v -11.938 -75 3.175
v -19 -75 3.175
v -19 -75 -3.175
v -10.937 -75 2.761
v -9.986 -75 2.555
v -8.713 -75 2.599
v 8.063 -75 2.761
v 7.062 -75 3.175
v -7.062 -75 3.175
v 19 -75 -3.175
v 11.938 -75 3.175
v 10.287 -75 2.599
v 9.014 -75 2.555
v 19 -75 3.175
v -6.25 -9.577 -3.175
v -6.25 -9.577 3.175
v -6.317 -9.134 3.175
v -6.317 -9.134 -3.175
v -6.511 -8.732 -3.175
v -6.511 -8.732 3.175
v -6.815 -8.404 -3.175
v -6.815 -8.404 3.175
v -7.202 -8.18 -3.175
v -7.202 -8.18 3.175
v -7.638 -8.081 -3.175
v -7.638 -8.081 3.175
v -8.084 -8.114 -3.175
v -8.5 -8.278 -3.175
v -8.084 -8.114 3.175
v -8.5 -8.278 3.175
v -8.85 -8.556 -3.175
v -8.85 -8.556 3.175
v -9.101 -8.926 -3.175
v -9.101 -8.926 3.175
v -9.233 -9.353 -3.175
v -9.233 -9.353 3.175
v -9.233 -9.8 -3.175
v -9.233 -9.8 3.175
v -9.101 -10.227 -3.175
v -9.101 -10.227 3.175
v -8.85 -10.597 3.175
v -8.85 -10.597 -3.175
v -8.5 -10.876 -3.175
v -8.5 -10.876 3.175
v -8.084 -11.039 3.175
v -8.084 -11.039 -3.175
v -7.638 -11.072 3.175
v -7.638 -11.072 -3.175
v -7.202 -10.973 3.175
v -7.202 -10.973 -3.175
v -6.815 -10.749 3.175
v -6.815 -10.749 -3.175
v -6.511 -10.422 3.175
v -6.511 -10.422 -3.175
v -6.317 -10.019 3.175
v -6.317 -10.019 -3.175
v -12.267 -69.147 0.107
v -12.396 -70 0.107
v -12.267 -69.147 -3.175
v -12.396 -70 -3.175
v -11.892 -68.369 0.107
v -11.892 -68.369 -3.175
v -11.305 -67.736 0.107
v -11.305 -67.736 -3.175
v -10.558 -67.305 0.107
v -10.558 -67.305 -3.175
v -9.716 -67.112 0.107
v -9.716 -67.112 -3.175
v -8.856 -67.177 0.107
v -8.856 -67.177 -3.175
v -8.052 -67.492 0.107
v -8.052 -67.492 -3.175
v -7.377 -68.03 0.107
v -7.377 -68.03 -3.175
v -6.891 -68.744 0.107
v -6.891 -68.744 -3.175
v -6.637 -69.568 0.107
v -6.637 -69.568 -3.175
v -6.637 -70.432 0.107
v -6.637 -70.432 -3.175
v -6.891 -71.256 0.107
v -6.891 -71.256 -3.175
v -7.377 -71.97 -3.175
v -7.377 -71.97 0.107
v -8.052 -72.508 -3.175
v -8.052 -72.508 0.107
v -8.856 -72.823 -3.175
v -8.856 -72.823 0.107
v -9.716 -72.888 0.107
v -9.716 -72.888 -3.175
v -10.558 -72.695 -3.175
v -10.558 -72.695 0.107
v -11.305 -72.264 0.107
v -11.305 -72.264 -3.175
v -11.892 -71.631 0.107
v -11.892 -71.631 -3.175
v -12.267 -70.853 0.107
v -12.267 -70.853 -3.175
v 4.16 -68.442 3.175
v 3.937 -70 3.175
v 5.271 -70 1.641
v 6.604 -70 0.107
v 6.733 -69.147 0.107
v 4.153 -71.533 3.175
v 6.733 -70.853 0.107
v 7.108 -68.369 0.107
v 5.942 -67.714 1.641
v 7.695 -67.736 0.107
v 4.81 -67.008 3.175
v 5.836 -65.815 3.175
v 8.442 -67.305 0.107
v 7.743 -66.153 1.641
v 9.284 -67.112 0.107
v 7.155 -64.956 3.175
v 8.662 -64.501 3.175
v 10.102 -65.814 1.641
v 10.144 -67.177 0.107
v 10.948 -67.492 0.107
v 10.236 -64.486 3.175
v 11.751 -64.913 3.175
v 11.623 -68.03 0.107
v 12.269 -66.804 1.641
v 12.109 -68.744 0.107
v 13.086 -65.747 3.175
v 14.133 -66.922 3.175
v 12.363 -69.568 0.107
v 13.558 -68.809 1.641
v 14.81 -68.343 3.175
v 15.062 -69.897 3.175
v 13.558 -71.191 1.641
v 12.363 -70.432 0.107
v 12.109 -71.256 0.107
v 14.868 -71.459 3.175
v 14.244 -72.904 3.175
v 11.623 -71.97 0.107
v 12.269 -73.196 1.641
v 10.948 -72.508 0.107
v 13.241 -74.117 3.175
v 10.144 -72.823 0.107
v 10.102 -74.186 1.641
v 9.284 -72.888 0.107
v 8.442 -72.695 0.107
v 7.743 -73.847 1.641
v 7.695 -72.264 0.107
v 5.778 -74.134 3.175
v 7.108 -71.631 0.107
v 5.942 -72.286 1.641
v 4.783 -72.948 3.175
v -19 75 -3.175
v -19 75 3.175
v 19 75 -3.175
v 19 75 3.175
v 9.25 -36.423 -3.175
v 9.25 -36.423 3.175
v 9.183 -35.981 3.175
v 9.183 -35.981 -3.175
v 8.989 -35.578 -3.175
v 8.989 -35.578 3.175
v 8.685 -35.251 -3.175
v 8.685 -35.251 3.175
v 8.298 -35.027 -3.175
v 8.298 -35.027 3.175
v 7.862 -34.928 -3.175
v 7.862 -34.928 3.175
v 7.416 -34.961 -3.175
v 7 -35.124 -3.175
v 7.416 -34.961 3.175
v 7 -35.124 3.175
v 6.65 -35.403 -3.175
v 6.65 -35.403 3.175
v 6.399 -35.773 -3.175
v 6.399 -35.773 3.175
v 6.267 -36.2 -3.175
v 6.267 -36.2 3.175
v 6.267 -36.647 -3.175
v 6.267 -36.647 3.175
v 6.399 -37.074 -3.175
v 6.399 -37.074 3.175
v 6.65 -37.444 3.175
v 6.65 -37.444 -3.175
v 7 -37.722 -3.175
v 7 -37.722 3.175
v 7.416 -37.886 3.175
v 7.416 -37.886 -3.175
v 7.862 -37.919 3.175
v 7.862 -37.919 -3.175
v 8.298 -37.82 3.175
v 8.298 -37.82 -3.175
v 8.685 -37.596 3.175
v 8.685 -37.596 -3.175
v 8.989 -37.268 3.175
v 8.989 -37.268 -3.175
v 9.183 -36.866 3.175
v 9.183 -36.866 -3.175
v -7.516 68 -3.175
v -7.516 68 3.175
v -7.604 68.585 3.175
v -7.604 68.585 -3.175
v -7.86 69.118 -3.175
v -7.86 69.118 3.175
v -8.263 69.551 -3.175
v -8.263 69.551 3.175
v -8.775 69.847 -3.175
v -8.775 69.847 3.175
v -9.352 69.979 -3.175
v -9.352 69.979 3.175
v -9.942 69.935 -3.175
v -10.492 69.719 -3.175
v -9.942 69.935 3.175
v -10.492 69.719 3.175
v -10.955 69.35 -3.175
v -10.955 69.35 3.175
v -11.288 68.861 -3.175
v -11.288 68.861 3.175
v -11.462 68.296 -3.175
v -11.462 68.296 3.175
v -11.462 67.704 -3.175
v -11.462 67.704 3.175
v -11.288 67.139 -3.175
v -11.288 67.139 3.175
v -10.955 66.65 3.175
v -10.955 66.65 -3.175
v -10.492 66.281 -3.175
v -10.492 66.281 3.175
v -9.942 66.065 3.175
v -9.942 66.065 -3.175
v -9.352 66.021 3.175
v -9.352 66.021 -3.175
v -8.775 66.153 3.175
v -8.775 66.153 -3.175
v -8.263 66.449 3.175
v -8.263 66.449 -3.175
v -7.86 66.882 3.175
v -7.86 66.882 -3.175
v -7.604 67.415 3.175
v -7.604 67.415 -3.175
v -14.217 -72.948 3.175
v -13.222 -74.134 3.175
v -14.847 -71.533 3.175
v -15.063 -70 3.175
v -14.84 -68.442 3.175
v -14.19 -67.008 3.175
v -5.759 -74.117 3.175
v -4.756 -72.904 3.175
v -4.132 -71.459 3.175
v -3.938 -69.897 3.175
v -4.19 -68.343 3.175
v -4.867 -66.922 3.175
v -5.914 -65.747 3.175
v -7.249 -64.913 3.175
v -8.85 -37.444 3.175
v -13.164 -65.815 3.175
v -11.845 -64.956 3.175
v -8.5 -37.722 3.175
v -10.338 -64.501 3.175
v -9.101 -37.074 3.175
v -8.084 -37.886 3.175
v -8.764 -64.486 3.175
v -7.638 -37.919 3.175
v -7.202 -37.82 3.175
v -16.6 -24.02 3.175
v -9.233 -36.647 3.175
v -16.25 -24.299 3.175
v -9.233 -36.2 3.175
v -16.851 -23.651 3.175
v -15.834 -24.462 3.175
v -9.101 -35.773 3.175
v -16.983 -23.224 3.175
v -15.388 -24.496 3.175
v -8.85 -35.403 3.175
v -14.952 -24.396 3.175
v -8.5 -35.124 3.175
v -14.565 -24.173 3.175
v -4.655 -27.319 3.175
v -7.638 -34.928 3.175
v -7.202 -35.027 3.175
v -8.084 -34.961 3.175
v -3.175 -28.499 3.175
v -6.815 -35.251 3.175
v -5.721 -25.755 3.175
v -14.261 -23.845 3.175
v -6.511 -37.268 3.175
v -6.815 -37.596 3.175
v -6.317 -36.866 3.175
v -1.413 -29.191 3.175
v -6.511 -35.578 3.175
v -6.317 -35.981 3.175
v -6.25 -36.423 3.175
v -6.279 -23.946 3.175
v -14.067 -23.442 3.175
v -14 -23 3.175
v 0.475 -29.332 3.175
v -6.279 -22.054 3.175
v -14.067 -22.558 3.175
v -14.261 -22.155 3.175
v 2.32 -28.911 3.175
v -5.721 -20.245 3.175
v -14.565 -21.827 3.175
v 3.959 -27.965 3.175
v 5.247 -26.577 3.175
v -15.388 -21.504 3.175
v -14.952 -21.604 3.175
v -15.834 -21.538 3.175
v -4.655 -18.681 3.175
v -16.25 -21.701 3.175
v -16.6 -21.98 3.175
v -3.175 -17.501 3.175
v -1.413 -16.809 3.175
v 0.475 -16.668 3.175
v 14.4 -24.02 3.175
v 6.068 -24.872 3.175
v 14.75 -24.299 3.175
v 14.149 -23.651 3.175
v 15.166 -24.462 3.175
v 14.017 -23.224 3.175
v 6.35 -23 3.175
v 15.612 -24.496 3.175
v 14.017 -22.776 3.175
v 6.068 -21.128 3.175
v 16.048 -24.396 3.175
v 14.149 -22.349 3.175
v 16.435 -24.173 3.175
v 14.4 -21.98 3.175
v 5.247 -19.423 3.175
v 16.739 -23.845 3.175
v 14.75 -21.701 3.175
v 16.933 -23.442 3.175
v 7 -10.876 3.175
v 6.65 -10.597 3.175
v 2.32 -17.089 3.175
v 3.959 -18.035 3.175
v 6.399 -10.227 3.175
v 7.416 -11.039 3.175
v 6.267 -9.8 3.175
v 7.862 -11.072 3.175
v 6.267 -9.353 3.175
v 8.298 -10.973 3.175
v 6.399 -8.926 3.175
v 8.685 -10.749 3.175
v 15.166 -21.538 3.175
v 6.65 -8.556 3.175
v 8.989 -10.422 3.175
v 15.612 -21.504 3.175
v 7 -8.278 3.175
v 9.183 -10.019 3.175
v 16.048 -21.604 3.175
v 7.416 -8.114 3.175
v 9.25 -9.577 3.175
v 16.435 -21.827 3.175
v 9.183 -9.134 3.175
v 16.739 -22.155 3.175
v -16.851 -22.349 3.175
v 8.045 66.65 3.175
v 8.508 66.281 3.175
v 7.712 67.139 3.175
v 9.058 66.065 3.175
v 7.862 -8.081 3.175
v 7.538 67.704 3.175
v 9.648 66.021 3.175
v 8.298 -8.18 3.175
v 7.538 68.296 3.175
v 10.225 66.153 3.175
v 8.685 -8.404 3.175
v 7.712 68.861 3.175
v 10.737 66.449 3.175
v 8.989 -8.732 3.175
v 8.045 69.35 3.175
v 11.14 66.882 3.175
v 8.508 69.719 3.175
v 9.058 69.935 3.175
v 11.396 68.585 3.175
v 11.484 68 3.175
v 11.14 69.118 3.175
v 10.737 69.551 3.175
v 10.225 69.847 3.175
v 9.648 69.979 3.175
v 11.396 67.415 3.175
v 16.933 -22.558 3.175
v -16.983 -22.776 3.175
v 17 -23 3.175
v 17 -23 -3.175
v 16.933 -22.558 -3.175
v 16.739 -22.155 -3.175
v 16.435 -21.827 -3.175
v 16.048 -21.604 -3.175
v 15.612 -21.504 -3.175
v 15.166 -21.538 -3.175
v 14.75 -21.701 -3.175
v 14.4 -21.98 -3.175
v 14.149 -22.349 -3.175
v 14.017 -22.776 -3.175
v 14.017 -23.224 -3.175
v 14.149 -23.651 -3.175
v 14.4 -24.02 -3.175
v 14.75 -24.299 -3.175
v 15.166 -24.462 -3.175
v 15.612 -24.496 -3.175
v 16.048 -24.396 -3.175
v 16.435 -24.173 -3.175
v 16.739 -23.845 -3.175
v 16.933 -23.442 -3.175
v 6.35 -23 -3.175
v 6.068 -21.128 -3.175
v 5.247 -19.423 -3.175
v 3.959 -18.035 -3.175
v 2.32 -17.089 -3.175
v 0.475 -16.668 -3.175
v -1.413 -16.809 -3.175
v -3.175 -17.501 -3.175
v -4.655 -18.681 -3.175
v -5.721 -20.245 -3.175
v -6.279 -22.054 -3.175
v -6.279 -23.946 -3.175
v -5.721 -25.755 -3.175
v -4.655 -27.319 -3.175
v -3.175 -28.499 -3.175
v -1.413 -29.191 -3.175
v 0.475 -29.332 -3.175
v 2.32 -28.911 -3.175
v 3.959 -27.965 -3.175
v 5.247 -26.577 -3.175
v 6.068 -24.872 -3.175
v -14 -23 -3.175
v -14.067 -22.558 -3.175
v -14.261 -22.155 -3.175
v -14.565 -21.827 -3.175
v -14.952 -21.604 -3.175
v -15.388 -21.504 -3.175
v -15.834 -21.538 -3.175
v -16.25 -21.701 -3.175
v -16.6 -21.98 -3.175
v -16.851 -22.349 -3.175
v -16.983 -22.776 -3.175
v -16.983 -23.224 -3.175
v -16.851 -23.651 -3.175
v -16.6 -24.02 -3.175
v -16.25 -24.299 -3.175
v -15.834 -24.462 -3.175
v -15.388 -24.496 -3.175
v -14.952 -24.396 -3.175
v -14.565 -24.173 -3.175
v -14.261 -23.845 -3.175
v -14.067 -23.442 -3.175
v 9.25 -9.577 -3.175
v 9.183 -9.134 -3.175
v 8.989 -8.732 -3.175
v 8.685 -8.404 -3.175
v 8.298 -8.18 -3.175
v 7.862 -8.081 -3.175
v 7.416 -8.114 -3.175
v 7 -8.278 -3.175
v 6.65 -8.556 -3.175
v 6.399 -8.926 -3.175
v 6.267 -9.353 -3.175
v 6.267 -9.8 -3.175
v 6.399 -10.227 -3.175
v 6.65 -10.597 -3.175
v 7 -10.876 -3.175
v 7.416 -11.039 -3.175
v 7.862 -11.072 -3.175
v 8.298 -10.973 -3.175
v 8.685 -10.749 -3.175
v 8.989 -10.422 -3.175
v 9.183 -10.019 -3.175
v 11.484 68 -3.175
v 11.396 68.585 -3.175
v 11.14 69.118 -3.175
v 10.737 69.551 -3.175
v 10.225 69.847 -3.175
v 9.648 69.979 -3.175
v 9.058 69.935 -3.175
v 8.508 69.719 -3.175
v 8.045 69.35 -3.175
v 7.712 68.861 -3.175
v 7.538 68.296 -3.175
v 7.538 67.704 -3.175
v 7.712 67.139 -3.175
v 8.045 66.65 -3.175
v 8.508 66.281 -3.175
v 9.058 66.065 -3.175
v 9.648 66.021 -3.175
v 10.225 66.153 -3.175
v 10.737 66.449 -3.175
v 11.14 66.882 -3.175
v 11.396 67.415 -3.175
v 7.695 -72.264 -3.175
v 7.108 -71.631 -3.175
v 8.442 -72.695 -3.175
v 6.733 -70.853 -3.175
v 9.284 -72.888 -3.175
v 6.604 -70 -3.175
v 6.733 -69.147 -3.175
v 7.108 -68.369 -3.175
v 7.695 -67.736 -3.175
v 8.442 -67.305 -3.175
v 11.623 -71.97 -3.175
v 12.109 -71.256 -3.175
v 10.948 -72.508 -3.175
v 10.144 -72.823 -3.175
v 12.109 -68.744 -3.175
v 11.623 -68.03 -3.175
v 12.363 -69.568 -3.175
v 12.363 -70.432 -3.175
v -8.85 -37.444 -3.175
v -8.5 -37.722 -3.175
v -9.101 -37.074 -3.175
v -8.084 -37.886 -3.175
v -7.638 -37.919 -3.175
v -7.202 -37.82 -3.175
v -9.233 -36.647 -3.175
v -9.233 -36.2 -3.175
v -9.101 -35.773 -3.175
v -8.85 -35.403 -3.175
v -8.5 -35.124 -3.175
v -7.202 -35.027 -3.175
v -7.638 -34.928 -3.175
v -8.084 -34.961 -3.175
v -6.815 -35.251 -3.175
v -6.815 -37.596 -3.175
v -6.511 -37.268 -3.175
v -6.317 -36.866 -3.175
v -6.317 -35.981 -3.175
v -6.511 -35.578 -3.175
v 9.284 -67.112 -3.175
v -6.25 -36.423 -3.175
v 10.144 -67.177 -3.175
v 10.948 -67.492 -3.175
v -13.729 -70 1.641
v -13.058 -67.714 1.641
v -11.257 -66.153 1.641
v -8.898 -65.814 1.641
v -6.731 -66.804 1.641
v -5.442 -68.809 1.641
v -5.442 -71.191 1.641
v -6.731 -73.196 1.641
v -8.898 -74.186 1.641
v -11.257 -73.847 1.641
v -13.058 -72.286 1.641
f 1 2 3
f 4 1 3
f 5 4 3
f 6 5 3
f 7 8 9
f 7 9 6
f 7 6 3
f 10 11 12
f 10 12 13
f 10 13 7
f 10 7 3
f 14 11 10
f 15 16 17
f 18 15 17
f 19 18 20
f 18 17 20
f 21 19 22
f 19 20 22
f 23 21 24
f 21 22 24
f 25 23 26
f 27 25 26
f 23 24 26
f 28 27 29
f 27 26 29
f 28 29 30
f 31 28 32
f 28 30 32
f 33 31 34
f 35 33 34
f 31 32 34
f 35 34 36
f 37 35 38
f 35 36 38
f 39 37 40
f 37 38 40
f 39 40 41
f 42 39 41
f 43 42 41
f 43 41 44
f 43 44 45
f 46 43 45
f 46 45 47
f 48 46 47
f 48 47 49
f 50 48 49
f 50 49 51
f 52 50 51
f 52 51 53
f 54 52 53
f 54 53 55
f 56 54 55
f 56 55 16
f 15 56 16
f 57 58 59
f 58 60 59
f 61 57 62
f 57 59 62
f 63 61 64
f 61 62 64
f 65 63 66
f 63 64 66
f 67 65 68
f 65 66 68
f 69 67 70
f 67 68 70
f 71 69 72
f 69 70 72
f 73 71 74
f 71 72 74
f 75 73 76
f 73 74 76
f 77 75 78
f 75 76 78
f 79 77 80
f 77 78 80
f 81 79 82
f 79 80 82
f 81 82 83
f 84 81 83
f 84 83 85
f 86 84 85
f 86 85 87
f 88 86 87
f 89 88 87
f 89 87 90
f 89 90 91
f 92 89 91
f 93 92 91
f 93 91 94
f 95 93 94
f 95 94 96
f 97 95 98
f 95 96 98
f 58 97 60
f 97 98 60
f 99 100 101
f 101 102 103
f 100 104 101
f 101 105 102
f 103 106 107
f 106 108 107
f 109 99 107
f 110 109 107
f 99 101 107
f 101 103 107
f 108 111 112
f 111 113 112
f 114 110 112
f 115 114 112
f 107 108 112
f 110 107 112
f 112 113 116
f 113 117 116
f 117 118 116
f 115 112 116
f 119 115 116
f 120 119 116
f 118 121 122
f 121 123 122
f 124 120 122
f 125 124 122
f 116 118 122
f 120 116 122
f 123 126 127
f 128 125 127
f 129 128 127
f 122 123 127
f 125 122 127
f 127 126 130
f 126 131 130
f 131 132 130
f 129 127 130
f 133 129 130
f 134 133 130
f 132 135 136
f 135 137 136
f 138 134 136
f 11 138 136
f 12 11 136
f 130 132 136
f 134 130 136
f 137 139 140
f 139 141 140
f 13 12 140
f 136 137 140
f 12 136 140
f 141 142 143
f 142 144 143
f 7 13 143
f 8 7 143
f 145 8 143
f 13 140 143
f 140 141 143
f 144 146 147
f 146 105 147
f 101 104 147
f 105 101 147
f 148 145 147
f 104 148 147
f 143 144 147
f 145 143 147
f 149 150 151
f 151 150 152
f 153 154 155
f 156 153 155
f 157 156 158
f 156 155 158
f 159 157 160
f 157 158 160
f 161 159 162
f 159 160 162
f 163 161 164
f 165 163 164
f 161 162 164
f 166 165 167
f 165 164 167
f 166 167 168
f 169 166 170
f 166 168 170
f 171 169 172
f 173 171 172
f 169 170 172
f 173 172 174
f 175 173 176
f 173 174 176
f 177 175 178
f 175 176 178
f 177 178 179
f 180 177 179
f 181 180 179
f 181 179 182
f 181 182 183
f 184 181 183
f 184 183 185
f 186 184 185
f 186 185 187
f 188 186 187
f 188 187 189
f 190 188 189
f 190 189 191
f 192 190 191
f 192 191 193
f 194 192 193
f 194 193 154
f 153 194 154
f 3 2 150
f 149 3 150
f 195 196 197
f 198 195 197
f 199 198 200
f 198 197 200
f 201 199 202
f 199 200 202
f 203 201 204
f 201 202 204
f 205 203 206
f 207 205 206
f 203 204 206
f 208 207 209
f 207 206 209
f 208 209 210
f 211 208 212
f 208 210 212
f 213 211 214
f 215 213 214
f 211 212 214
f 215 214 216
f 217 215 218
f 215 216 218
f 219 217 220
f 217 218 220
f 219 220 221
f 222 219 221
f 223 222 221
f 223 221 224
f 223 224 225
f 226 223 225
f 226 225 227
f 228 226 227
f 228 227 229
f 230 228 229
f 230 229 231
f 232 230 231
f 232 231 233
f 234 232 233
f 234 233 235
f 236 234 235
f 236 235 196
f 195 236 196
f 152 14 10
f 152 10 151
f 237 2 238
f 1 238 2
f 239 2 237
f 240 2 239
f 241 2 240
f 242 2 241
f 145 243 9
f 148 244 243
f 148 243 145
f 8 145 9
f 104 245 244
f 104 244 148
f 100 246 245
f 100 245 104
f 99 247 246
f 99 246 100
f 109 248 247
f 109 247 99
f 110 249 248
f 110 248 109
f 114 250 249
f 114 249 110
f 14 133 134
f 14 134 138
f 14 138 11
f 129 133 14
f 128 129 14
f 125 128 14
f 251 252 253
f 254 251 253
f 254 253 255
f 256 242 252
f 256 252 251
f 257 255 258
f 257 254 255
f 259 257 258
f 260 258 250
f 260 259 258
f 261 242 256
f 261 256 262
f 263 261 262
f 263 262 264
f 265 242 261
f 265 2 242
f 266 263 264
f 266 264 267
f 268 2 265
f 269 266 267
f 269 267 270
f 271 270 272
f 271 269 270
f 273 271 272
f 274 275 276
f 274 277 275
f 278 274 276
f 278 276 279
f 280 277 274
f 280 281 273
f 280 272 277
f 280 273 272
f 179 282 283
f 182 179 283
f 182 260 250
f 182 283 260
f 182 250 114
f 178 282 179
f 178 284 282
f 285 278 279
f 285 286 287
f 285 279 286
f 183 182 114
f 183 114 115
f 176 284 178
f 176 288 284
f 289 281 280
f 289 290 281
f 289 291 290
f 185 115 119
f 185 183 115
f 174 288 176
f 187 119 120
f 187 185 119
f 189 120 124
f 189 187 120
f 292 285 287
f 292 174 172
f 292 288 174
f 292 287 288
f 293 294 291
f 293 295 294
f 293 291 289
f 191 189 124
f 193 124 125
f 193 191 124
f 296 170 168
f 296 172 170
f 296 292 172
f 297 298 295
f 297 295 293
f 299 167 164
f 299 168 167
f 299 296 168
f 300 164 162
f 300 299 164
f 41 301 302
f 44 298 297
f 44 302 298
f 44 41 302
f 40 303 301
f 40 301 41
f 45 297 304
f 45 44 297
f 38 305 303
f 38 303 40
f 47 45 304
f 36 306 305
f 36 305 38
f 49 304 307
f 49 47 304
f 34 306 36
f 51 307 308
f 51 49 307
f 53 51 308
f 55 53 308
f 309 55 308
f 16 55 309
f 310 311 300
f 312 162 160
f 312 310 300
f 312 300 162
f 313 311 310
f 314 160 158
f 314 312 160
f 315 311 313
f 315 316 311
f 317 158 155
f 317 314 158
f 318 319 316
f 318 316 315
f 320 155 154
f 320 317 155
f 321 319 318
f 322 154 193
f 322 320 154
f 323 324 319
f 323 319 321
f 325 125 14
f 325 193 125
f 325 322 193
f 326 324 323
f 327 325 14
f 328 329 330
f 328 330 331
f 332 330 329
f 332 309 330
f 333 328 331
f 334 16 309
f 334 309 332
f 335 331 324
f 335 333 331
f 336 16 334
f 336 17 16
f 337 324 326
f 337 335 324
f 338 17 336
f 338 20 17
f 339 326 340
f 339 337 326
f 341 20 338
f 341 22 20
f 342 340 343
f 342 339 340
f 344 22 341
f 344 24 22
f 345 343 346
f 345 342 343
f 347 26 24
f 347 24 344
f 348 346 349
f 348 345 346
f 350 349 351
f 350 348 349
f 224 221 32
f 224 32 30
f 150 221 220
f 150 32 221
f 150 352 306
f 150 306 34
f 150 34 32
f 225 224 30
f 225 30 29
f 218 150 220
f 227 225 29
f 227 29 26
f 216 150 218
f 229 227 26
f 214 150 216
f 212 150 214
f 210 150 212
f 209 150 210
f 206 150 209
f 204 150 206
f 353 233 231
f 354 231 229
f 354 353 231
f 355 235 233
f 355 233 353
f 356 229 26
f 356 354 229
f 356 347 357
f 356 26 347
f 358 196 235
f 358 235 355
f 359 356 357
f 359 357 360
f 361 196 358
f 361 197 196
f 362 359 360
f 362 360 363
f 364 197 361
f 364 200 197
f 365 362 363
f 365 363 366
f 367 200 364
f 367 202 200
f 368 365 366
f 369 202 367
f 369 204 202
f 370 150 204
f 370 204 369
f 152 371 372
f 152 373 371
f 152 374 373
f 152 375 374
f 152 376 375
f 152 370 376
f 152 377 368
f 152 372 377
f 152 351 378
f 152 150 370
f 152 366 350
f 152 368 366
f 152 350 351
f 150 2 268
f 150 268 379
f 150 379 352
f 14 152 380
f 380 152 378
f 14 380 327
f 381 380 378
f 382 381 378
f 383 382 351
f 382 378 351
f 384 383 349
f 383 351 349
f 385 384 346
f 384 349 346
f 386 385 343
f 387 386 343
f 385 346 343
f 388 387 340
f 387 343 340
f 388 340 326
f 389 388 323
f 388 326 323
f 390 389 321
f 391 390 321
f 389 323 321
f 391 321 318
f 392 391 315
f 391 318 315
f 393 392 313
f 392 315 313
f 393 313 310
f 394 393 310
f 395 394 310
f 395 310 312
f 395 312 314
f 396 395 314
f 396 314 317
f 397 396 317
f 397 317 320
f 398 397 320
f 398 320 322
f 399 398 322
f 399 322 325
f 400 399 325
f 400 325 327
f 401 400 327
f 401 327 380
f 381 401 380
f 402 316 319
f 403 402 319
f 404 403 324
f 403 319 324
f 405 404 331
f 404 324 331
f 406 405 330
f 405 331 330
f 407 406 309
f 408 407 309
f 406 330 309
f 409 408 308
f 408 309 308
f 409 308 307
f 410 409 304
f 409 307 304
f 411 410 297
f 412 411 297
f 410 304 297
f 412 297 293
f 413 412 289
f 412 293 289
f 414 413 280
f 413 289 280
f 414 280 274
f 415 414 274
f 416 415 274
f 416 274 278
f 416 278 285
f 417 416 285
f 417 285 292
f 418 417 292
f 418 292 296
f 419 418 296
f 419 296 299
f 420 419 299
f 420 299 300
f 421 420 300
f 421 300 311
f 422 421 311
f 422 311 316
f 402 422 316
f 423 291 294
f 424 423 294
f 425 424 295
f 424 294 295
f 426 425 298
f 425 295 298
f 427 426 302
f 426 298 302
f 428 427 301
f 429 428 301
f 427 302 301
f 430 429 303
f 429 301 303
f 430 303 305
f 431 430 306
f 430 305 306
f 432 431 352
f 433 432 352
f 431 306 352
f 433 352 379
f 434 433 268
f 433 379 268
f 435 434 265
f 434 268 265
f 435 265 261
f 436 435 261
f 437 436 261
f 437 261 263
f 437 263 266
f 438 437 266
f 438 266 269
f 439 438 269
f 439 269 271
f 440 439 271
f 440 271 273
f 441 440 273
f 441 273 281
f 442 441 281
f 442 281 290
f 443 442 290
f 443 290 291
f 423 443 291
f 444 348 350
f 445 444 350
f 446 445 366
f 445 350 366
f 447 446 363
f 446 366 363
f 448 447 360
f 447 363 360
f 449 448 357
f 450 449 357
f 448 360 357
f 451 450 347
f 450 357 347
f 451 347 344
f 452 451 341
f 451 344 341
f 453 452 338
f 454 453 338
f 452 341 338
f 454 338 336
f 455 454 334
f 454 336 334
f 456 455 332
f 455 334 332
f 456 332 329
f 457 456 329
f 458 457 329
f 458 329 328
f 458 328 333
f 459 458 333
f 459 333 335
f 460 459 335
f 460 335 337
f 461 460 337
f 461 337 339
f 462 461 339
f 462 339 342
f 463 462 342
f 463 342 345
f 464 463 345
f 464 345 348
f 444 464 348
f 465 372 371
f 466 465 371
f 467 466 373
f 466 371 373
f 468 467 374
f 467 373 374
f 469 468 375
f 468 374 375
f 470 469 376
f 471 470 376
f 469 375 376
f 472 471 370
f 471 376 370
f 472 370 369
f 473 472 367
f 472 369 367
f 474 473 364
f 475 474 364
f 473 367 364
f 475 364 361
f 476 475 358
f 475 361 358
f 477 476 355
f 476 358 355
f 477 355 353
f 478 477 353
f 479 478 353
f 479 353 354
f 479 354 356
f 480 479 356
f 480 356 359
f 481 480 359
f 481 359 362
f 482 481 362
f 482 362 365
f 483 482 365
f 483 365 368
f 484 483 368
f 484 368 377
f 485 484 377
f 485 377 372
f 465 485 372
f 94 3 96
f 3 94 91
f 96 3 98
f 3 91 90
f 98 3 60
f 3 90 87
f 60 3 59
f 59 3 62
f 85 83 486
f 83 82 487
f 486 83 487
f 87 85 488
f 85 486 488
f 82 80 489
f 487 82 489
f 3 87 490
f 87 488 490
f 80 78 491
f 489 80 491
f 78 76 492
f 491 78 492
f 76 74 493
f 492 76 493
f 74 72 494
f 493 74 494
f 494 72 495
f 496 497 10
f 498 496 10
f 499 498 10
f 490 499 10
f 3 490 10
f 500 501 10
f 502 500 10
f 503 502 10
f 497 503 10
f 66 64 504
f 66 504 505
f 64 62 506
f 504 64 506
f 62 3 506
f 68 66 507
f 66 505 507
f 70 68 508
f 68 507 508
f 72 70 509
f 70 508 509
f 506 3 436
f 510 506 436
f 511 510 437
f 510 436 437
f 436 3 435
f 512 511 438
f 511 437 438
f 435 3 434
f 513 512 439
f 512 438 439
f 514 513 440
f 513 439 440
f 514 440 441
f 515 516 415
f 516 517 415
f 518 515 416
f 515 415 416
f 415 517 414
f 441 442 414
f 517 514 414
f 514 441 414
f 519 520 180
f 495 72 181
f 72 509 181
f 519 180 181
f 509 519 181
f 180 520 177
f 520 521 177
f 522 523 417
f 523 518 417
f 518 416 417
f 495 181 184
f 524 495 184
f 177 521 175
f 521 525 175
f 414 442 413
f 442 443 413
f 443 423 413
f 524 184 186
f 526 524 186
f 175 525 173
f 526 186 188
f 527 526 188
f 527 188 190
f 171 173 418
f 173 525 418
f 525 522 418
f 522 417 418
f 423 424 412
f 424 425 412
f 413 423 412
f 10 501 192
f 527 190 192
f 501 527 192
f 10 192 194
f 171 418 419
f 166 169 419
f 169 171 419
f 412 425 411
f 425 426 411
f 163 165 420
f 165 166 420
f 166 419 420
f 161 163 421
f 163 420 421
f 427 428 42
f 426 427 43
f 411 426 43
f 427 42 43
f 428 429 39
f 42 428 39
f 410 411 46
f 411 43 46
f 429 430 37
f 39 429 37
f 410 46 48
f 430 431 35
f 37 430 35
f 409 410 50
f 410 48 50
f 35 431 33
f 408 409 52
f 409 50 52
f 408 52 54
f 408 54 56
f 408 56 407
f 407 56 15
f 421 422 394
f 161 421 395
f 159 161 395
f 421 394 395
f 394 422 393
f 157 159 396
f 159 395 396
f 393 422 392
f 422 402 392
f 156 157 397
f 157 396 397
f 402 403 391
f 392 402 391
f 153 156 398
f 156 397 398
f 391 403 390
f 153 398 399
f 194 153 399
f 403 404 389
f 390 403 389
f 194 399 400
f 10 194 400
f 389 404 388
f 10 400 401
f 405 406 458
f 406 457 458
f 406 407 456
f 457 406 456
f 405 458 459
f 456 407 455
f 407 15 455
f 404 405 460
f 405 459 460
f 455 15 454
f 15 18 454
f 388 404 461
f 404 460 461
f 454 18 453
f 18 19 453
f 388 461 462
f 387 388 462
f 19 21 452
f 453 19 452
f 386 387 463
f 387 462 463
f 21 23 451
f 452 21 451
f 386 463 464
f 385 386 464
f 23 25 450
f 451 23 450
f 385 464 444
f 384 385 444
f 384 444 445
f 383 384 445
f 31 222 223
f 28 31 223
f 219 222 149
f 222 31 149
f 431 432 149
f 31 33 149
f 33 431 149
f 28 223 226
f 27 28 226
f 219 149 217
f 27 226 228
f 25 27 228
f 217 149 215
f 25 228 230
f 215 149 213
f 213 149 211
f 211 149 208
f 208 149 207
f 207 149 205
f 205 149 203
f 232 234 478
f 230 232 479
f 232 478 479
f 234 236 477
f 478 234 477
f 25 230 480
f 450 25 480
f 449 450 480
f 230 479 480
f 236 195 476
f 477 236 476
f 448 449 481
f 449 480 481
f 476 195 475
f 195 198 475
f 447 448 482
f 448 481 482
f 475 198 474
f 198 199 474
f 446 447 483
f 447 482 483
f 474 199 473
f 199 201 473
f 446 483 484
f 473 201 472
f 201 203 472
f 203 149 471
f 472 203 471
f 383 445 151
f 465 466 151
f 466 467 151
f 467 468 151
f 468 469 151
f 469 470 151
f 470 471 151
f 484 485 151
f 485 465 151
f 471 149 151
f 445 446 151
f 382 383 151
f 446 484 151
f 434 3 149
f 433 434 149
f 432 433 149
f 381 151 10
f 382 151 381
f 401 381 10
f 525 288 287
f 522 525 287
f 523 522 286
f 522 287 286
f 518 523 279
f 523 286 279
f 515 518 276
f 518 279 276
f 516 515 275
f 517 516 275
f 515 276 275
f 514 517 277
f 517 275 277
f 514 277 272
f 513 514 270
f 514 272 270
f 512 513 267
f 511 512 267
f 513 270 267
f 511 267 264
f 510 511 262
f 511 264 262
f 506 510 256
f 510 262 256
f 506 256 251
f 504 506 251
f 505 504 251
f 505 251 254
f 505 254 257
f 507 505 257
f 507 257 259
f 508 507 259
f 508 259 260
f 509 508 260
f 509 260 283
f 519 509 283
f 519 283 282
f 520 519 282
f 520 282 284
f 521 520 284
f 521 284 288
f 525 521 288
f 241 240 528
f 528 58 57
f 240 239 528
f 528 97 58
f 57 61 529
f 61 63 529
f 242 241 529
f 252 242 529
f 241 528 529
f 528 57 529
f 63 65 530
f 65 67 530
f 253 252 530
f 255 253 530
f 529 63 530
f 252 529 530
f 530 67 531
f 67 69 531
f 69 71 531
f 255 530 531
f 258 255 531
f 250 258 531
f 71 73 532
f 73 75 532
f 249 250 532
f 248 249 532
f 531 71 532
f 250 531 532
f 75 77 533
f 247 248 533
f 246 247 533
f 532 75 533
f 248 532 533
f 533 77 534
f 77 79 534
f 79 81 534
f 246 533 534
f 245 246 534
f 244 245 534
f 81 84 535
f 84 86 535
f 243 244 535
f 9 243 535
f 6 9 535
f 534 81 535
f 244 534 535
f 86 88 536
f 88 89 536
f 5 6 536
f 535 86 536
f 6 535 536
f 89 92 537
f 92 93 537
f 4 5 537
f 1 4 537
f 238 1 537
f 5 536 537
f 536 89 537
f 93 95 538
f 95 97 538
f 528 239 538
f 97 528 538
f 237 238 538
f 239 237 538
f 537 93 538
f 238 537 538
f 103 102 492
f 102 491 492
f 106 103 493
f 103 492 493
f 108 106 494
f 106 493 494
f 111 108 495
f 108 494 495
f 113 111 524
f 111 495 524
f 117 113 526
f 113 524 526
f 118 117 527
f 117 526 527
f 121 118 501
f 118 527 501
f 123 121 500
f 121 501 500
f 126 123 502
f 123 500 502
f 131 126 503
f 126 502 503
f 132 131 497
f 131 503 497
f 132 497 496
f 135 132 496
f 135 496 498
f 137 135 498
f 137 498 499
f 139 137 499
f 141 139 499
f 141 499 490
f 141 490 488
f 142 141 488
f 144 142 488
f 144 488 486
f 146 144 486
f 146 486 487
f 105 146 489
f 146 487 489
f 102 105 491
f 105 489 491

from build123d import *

# Parameters (mm, degrees)
CROQUIS1_W                                           = 38
CROQUIS1_H                                           = 150
SALIENTE_EXTRUIR1_DEPTH                              = 3.175
CROQUIS3_R                                           = 6.35
CROQUIS3_R_2                                         = 1.5
CORTAR_EXTRUIR2_DEPTH                                = 25.4
AVELLANADO_PARA_TORNILLO_CON_CABEZA_OVAL_D           = 5.7912
AVELLANADO_PARA_TORNILLO_CON_CABEZA_OVAL_DEPTH       = 20
AVELLANADO_PARA_TORNILLO_CON_CABEZA_OVAL_CSINK_D     = 11.1252
AVELLANADO_PARA_TORNILLO_CON_CABEZA_OVAL_CSINK_ANGLE = 82
AVELLANADO_PARA_TORNILLO_CON_CABEZA_OVAL_TIP         = 1.739852008
CROQUIS7_R                                           = 1.984375
CORTAR_EXTRUIR3_DEPTH                                = 25.4


with BuildPart() as part:
    # Croquis1 → Saliente-Extruir1 (new, symmetric)
    with BuildSketch(Plane.XY):
        Rectangle(CROQUIS1_W, CROQUIS1_H)
    extrude(amount=SALIENTE_EXTRUIR1_DEPTH, both=True)

    # Croquis3 → Cortar-Extruir2 (cut)
    with BuildSketch(Plane.XY.offset(3.175)):
        with Locations((0, -23)):
            Circle(CROQUIS3_R)
        with Locations((-15.5, -23)):
            Circle(CROQUIS3_R_2)
        with Locations((-7.75, -9.576606241)):
            Circle(CROQUIS3_R_2)
        with Locations((7.75, -9.576606241)):
            Circle(CROQUIS3_R_2)
        with Locations((15.5, -23)):
            Circle(CROQUIS3_R_2)
        with Locations((7.75, -36.423393759)):
            Circle(CROQUIS3_R_2)
        with Locations((-7.75, -36.423393759)):
            Circle(CROQUIS3_R_2)
    extrude(amount=-CORTAR_EXTRUIR2_DEPTH, mode=Mode.SUBTRACT)

    # Avellanado para tornillo con cabeza ovalada de #121
    with Locations(Plane(origin=(-9.5, -70, 3.175), x_dir=(1, 0, 0), z_dir=(0, 0, 1))):
        with Locations((0, 0), (19, 0)):
            CounterSinkHole(AVELLANADO_PARA_TORNILLO_CON_CABEZA_OVAL_D / 2, AVELLANADO_PARA_TORNILLO_CON_CABEZA_OVAL_CSINK_D / 2, depth=AVELLANADO_PARA_TORNILLO_CON_CABEZA_OVAL_DEPTH, counter_sink_angle=AVELLANADO_PARA_TORNILLO_CON_CABEZA_OVAL_CSINK_ANGLE)
            with Locations((0, 0, -(AVELLANADO_PARA_TORNILLO_CON_CABEZA_OVAL_DEPTH + AVELLANADO_PARA_TORNILLO_CON_CABEZA_OVAL_TIP / 2))):  # 118° drill point
                Cone(0, AVELLANADO_PARA_TORNILLO_CON_CABEZA_OVAL_D / 2, AVELLANADO_PARA_TORNILLO_CON_CABEZA_OVAL_TIP, mode=Mode.SUBTRACT)

    # Croquis7 → Cortar-Extruir3 (cut)
    with BuildSketch(Plane.XY.offset(3.175)):
        with Locations((9.5, 68)):
            Circle(CROQUIS7_R)
        with Locations((-9.5, 68)):
            Circle(CROQUIS7_R)
    extrude(amount=-CORTAR_EXTRUIR3_DEPTH, mode=Mode.SUBTRACT)


solid = part.part
